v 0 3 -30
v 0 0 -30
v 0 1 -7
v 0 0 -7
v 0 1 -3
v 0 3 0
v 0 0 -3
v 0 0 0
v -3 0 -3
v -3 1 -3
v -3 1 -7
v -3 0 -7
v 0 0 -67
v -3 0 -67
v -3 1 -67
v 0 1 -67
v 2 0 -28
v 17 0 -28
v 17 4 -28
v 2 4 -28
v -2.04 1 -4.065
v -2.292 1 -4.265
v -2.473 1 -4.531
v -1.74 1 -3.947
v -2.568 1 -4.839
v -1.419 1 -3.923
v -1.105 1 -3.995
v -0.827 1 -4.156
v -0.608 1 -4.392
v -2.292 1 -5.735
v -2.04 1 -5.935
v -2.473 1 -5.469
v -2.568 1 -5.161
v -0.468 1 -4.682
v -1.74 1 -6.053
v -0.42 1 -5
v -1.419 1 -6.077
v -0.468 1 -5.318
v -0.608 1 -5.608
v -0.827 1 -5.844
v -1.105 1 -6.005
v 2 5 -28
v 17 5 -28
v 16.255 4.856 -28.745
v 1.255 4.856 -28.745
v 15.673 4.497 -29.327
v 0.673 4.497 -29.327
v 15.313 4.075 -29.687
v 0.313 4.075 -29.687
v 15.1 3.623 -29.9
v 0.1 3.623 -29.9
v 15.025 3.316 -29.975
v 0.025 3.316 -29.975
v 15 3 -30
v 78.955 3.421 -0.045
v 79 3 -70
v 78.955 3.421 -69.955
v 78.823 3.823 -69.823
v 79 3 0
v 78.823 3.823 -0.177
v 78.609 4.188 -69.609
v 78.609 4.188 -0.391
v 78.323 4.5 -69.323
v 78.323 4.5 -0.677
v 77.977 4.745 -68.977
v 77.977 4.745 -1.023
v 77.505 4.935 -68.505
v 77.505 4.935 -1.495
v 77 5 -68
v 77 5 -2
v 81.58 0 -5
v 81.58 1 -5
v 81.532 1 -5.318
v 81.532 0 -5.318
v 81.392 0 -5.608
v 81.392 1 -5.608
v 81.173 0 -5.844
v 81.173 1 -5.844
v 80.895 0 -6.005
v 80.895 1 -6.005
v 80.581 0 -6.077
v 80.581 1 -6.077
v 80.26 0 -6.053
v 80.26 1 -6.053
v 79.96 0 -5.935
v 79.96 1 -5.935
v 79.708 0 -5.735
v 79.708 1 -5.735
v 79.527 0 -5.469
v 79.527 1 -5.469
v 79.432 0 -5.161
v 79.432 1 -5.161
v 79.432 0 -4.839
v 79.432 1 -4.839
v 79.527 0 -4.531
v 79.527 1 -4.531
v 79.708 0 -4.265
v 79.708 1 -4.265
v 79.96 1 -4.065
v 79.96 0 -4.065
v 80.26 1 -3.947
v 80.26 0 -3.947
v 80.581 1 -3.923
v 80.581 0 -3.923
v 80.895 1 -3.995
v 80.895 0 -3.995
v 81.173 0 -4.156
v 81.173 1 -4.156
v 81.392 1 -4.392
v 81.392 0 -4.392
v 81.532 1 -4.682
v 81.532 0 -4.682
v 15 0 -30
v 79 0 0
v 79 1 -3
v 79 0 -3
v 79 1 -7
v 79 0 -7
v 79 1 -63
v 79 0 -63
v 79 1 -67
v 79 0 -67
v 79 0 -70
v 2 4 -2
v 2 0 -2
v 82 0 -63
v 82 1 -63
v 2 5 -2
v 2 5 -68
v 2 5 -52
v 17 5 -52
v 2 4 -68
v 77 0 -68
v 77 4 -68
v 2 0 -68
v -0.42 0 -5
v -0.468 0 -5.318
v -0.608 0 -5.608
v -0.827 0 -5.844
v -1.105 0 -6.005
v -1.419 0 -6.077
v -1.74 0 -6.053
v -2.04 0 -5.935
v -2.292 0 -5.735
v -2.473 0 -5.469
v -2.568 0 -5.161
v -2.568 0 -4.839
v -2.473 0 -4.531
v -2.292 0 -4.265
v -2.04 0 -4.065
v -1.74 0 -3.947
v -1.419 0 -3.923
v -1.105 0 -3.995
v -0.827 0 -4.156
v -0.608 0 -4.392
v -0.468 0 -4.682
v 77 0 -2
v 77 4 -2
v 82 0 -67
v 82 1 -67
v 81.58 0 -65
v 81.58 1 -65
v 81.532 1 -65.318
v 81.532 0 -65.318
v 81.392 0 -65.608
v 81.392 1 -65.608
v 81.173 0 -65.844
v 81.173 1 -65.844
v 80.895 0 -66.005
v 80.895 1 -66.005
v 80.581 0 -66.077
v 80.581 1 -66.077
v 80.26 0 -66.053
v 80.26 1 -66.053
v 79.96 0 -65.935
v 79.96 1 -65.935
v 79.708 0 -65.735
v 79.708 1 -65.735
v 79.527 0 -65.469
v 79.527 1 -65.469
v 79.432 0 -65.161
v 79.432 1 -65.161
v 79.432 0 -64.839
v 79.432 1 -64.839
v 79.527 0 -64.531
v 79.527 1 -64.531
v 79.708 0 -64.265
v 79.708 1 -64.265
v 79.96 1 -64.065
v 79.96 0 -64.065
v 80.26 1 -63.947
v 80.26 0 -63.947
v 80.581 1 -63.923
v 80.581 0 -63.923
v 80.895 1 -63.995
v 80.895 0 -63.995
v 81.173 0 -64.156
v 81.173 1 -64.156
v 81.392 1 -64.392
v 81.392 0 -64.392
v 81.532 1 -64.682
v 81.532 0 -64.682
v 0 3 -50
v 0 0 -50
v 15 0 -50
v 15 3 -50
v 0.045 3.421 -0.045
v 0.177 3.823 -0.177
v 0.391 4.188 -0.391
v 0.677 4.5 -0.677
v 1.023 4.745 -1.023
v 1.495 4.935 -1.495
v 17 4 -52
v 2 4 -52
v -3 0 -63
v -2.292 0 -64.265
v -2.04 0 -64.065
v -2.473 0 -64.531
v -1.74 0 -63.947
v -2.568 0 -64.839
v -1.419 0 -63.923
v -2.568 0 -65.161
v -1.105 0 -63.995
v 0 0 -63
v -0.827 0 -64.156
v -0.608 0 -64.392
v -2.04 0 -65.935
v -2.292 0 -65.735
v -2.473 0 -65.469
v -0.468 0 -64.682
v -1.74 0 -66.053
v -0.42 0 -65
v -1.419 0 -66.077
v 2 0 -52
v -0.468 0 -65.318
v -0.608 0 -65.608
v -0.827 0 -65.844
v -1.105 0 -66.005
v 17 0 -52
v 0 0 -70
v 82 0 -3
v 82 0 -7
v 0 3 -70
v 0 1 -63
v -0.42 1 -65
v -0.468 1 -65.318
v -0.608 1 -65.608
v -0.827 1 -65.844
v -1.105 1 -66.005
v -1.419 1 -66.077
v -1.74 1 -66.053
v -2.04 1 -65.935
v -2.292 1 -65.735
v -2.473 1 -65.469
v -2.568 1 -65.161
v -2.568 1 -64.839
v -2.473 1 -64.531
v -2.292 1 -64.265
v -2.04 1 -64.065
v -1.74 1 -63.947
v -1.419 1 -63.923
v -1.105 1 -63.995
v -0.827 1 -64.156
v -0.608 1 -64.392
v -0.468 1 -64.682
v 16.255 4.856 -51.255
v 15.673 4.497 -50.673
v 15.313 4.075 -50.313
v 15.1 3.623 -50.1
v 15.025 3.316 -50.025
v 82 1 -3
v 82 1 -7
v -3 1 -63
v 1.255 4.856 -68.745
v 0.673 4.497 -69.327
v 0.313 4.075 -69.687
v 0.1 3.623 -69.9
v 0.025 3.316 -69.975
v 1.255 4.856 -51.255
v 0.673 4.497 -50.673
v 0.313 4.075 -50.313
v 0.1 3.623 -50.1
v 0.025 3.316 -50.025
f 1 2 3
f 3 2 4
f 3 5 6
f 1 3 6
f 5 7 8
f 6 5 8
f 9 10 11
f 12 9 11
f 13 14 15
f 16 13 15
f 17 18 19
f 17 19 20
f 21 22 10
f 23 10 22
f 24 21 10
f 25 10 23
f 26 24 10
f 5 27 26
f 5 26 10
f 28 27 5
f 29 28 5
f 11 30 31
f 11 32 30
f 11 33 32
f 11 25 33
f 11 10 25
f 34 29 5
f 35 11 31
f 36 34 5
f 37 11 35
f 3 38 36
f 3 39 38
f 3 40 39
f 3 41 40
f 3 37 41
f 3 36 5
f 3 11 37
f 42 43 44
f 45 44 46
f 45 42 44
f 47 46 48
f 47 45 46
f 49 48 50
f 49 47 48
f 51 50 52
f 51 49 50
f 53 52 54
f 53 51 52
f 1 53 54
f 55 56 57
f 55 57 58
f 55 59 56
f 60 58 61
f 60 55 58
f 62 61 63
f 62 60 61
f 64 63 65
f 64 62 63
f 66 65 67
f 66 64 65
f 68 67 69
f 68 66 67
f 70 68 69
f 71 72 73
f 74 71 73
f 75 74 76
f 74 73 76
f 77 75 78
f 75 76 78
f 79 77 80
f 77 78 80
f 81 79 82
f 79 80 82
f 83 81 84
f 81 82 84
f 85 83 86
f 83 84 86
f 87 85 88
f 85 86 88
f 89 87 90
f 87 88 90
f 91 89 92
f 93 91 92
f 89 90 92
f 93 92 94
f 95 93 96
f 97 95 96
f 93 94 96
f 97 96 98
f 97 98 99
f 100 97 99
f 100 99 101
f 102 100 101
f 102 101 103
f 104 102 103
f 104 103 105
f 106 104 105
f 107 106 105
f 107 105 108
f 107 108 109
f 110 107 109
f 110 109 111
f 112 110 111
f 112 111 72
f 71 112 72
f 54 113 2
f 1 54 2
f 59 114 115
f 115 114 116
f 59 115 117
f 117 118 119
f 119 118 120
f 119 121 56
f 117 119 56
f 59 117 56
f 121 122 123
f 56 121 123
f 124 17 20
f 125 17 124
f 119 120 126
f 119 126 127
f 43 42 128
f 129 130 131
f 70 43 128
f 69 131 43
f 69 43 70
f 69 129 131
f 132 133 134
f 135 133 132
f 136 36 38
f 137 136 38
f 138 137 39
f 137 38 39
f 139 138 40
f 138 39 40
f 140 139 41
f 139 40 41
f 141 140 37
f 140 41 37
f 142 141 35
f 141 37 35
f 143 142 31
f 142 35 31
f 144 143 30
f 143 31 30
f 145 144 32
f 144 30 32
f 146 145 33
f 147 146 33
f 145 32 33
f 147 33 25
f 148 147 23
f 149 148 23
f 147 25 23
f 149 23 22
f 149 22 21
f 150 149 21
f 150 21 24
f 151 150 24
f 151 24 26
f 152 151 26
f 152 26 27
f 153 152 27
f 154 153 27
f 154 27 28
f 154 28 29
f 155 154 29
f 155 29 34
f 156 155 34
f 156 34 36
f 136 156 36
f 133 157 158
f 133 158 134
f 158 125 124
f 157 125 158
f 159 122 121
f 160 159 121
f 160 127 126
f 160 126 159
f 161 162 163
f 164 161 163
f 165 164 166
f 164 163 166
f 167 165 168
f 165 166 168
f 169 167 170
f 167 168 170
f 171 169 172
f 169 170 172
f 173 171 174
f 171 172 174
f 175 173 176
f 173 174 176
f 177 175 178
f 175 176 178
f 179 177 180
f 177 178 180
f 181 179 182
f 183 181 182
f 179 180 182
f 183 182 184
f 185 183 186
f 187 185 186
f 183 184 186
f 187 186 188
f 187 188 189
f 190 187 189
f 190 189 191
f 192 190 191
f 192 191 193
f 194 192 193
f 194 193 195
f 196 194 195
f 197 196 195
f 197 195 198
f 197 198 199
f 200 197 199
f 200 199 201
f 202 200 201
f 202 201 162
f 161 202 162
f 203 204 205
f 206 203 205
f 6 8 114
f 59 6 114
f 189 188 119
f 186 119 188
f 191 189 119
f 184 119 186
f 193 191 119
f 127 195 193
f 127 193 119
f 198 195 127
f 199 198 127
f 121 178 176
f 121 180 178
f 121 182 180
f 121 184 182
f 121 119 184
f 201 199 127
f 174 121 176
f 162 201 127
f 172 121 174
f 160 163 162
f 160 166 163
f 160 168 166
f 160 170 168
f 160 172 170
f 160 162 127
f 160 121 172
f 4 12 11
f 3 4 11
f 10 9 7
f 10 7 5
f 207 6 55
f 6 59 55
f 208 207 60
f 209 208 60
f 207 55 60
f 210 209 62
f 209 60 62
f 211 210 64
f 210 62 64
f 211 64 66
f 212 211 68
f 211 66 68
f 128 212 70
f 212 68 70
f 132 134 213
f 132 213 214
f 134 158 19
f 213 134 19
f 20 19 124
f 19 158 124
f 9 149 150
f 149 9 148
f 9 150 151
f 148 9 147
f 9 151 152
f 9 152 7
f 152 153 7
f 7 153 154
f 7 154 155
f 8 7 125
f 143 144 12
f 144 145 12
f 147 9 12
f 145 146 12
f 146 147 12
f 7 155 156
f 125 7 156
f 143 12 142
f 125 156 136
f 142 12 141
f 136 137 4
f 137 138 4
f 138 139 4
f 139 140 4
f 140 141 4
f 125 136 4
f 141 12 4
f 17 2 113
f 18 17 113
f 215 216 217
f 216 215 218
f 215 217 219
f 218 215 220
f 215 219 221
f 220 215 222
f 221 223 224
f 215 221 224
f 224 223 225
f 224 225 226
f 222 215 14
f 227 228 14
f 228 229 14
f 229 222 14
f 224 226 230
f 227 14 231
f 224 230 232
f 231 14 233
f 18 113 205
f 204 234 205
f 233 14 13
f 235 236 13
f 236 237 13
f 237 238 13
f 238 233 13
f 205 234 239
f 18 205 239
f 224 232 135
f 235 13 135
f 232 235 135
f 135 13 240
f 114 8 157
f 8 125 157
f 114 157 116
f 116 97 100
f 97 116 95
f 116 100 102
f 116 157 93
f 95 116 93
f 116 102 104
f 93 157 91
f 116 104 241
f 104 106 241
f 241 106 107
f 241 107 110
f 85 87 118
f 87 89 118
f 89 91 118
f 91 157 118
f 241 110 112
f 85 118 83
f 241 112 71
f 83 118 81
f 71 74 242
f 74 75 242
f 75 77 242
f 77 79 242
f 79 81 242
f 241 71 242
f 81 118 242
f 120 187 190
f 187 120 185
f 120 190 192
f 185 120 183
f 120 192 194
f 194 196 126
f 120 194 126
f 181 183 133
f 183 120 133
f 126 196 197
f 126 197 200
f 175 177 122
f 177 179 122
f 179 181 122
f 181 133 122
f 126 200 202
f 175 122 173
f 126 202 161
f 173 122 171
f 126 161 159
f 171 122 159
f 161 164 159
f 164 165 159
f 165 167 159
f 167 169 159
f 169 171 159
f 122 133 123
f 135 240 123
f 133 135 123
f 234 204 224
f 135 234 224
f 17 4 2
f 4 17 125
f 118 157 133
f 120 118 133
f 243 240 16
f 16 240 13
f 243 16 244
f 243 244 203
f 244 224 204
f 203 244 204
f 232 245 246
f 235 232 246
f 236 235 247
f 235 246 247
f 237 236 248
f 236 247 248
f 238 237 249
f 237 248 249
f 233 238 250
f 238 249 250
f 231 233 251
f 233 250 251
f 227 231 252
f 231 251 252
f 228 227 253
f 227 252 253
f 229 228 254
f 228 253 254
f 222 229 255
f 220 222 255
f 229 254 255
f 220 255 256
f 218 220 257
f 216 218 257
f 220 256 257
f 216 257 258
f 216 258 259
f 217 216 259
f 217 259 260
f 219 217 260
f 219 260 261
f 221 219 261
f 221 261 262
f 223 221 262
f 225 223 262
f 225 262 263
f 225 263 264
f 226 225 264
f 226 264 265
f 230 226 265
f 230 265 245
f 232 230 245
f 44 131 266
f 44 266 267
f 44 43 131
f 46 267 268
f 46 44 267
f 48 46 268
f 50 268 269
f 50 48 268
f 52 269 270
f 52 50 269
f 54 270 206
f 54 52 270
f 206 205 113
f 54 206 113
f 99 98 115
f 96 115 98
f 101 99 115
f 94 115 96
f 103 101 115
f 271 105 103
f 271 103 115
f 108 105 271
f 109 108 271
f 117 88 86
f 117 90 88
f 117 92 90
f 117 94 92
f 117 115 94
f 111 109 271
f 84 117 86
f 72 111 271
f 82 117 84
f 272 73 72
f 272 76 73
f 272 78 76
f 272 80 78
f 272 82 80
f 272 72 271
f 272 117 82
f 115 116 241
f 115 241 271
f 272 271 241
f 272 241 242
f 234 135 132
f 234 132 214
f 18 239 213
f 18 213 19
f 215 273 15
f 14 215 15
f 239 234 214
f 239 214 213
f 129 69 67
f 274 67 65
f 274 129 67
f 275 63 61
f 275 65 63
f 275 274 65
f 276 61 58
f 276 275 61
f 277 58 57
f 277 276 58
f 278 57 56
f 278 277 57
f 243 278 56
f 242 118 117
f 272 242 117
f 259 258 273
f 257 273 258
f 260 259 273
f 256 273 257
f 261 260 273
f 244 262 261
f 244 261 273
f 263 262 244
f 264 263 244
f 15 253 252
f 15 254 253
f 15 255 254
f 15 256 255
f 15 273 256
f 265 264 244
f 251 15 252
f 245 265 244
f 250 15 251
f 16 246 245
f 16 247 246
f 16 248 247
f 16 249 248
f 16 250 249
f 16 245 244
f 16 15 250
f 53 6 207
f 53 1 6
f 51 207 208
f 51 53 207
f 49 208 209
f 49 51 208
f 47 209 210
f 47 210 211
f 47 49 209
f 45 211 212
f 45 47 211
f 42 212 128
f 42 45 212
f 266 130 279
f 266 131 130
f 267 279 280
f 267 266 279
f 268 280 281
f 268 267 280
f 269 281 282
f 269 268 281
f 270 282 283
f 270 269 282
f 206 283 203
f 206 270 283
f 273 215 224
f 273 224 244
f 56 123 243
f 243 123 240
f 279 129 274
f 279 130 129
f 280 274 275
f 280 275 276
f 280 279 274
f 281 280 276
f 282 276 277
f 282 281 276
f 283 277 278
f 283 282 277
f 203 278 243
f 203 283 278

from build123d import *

# Parameters (mm, degrees)
BOSS_EXTRUDE1_DEPTH  = 5
SKETCH3_W            = 4
SKETCH3_H            = 5
BOSS_EXTRUDE2_DEPTH  = 3
SKETCH4_R            = 1.08
CUT_EXTRUDE1_DEPTH   = 6
LPATTERN1_COUNT      = 2
LPATTERN1_PITCH      = 60
LPATTERN1_COUNT_DIR2 = 2
LPATTERN1_PITCH_DIR2 = 82
LPATTERN2_COUNT      = 2
LPATTERN2_PITCH      = 60
LPATTERN2_COUNT_DIR2 = 2
LPATTERN2_PITCH_DIR2 = 82
SKETCH5_W            = 3
SKETCH5_H            = 4
CUT_EXTRUDE2_DEPTH   = 4
CUT_EXTRUDE3_DEPTH   = 4
FILLET1_R            = 2


with BuildPart() as part:
    # Sketch2 → Boss-Extrude1 (new body)
    with BuildSketch(Plane(origin=(0, 0, 0), x_dir=(1, 0, 0), z_dir=(0, 1, 0))):
        Polygon((0, 0), (79, 0), (79, 70), (0, 70), (0, 50), (15, 50), (15, 30), (0, 30), align=None)
    extrude(amount=BOSS_EXTRUDE1_DEPTH)

    # Sketch3 → Boss-Extrude2 (add)
    with BuildSketch(Plane(origin=(79, 0, 0), x_dir=(0, 0, -1), z_dir=(1, 0, 0))):
        with Locations((5, 2.5)):
            Rectangle(SKETCH3_W, SKETCH3_H)
    boss_extrude2 = extrude(amount=BOSS_EXTRUDE2_DEPTH)

    # Sketch4 → Cut-Extrude1 (cut, through all)
    with BuildSketch(Plane(origin=(0, 5, 0), x_dir=(1, 0, 0), z_dir=(0, 1, 0))):
        with Locations((80.5, 5)):
            Circle(SKETCH4_R)
    cut_extrude1 = extrude(amount=-CUT_EXTRUDE1_DEPTH, mode=Mode.SUBTRACT)

    # LPattern1: Boss-Extrude2 2 × 2
    with Locations(*[(-j * LPATTERN1_PITCH_DIR2, 0, -i * LPATTERN1_PITCH) for i in range(LPATTERN1_COUNT) for j in range(LPATTERN1_COUNT_DIR2) if (i, j) != (0, 0)]):
        add(boss_extrude2)

    # LPattern2: Cut-Extrude1 2 × 2
    with Locations(*[(-j * LPATTERN2_PITCH_DIR2, 0, -i * LPATTERN2_PITCH) for i in range(LPATTERN2_COUNT) for j in range(LPATTERN2_COUNT_DIR2) if (i, j) != (0, 0)]):
        add(cut_extrude1, mode=Mode.SUBTRACT)

    # Sketch5 → Cut-Extrude2 (cut)
    with BuildSketch(Plane(origin=(0, 5, 0), x_dir=(1, 0, 0), z_dir=(0, 1, 0))):
        with Locations((-1.5, 65)):
            Rectangle(SKETCH5_W, SKETCH5_H)
        with Locations((-1.5, 5)):
            Rectangle(SKETCH5_W, SKETCH5_H)
        with Locations((80.5, 5)):
            Rectangle(SKETCH5_W, SKETCH5_H)
        with Locations((80.5, 65)):
            Rectangle(SKETCH5_W, SKETCH5_H)
    extrude(amount=-CUT_EXTRUDE2_DEPTH, mode=Mode.SUBTRACT)

    # Sketch7 → Cut-Extrude3 (cut)
    with BuildSketch(Plane.XZ):
        Polygon((2, -2), (77, -2), (77, -68), (2, -68), (2, -52), (17, -52), (17, -28), (2, -28), align=None)
    extrude(amount=-CUT_EXTRUDE3_DEPTH, mode=Mode.SUBTRACT)

    # Fillet1
    fillet1_edges = [part.edges().sort_by_distance(p)[0] for p in [
        (79, 5, -35),
        (39.5, 5, -70),
        (0, 5, -60),
        (7.5, 5, -50),
        (15, 5, -40),
        (7.5, 5, -30),
        (0, 5, -15),
        (39.5, 5, 0),
    ]]
    fillet(fillet1_edges, radius=FILLET1_R)


solid = part.part
